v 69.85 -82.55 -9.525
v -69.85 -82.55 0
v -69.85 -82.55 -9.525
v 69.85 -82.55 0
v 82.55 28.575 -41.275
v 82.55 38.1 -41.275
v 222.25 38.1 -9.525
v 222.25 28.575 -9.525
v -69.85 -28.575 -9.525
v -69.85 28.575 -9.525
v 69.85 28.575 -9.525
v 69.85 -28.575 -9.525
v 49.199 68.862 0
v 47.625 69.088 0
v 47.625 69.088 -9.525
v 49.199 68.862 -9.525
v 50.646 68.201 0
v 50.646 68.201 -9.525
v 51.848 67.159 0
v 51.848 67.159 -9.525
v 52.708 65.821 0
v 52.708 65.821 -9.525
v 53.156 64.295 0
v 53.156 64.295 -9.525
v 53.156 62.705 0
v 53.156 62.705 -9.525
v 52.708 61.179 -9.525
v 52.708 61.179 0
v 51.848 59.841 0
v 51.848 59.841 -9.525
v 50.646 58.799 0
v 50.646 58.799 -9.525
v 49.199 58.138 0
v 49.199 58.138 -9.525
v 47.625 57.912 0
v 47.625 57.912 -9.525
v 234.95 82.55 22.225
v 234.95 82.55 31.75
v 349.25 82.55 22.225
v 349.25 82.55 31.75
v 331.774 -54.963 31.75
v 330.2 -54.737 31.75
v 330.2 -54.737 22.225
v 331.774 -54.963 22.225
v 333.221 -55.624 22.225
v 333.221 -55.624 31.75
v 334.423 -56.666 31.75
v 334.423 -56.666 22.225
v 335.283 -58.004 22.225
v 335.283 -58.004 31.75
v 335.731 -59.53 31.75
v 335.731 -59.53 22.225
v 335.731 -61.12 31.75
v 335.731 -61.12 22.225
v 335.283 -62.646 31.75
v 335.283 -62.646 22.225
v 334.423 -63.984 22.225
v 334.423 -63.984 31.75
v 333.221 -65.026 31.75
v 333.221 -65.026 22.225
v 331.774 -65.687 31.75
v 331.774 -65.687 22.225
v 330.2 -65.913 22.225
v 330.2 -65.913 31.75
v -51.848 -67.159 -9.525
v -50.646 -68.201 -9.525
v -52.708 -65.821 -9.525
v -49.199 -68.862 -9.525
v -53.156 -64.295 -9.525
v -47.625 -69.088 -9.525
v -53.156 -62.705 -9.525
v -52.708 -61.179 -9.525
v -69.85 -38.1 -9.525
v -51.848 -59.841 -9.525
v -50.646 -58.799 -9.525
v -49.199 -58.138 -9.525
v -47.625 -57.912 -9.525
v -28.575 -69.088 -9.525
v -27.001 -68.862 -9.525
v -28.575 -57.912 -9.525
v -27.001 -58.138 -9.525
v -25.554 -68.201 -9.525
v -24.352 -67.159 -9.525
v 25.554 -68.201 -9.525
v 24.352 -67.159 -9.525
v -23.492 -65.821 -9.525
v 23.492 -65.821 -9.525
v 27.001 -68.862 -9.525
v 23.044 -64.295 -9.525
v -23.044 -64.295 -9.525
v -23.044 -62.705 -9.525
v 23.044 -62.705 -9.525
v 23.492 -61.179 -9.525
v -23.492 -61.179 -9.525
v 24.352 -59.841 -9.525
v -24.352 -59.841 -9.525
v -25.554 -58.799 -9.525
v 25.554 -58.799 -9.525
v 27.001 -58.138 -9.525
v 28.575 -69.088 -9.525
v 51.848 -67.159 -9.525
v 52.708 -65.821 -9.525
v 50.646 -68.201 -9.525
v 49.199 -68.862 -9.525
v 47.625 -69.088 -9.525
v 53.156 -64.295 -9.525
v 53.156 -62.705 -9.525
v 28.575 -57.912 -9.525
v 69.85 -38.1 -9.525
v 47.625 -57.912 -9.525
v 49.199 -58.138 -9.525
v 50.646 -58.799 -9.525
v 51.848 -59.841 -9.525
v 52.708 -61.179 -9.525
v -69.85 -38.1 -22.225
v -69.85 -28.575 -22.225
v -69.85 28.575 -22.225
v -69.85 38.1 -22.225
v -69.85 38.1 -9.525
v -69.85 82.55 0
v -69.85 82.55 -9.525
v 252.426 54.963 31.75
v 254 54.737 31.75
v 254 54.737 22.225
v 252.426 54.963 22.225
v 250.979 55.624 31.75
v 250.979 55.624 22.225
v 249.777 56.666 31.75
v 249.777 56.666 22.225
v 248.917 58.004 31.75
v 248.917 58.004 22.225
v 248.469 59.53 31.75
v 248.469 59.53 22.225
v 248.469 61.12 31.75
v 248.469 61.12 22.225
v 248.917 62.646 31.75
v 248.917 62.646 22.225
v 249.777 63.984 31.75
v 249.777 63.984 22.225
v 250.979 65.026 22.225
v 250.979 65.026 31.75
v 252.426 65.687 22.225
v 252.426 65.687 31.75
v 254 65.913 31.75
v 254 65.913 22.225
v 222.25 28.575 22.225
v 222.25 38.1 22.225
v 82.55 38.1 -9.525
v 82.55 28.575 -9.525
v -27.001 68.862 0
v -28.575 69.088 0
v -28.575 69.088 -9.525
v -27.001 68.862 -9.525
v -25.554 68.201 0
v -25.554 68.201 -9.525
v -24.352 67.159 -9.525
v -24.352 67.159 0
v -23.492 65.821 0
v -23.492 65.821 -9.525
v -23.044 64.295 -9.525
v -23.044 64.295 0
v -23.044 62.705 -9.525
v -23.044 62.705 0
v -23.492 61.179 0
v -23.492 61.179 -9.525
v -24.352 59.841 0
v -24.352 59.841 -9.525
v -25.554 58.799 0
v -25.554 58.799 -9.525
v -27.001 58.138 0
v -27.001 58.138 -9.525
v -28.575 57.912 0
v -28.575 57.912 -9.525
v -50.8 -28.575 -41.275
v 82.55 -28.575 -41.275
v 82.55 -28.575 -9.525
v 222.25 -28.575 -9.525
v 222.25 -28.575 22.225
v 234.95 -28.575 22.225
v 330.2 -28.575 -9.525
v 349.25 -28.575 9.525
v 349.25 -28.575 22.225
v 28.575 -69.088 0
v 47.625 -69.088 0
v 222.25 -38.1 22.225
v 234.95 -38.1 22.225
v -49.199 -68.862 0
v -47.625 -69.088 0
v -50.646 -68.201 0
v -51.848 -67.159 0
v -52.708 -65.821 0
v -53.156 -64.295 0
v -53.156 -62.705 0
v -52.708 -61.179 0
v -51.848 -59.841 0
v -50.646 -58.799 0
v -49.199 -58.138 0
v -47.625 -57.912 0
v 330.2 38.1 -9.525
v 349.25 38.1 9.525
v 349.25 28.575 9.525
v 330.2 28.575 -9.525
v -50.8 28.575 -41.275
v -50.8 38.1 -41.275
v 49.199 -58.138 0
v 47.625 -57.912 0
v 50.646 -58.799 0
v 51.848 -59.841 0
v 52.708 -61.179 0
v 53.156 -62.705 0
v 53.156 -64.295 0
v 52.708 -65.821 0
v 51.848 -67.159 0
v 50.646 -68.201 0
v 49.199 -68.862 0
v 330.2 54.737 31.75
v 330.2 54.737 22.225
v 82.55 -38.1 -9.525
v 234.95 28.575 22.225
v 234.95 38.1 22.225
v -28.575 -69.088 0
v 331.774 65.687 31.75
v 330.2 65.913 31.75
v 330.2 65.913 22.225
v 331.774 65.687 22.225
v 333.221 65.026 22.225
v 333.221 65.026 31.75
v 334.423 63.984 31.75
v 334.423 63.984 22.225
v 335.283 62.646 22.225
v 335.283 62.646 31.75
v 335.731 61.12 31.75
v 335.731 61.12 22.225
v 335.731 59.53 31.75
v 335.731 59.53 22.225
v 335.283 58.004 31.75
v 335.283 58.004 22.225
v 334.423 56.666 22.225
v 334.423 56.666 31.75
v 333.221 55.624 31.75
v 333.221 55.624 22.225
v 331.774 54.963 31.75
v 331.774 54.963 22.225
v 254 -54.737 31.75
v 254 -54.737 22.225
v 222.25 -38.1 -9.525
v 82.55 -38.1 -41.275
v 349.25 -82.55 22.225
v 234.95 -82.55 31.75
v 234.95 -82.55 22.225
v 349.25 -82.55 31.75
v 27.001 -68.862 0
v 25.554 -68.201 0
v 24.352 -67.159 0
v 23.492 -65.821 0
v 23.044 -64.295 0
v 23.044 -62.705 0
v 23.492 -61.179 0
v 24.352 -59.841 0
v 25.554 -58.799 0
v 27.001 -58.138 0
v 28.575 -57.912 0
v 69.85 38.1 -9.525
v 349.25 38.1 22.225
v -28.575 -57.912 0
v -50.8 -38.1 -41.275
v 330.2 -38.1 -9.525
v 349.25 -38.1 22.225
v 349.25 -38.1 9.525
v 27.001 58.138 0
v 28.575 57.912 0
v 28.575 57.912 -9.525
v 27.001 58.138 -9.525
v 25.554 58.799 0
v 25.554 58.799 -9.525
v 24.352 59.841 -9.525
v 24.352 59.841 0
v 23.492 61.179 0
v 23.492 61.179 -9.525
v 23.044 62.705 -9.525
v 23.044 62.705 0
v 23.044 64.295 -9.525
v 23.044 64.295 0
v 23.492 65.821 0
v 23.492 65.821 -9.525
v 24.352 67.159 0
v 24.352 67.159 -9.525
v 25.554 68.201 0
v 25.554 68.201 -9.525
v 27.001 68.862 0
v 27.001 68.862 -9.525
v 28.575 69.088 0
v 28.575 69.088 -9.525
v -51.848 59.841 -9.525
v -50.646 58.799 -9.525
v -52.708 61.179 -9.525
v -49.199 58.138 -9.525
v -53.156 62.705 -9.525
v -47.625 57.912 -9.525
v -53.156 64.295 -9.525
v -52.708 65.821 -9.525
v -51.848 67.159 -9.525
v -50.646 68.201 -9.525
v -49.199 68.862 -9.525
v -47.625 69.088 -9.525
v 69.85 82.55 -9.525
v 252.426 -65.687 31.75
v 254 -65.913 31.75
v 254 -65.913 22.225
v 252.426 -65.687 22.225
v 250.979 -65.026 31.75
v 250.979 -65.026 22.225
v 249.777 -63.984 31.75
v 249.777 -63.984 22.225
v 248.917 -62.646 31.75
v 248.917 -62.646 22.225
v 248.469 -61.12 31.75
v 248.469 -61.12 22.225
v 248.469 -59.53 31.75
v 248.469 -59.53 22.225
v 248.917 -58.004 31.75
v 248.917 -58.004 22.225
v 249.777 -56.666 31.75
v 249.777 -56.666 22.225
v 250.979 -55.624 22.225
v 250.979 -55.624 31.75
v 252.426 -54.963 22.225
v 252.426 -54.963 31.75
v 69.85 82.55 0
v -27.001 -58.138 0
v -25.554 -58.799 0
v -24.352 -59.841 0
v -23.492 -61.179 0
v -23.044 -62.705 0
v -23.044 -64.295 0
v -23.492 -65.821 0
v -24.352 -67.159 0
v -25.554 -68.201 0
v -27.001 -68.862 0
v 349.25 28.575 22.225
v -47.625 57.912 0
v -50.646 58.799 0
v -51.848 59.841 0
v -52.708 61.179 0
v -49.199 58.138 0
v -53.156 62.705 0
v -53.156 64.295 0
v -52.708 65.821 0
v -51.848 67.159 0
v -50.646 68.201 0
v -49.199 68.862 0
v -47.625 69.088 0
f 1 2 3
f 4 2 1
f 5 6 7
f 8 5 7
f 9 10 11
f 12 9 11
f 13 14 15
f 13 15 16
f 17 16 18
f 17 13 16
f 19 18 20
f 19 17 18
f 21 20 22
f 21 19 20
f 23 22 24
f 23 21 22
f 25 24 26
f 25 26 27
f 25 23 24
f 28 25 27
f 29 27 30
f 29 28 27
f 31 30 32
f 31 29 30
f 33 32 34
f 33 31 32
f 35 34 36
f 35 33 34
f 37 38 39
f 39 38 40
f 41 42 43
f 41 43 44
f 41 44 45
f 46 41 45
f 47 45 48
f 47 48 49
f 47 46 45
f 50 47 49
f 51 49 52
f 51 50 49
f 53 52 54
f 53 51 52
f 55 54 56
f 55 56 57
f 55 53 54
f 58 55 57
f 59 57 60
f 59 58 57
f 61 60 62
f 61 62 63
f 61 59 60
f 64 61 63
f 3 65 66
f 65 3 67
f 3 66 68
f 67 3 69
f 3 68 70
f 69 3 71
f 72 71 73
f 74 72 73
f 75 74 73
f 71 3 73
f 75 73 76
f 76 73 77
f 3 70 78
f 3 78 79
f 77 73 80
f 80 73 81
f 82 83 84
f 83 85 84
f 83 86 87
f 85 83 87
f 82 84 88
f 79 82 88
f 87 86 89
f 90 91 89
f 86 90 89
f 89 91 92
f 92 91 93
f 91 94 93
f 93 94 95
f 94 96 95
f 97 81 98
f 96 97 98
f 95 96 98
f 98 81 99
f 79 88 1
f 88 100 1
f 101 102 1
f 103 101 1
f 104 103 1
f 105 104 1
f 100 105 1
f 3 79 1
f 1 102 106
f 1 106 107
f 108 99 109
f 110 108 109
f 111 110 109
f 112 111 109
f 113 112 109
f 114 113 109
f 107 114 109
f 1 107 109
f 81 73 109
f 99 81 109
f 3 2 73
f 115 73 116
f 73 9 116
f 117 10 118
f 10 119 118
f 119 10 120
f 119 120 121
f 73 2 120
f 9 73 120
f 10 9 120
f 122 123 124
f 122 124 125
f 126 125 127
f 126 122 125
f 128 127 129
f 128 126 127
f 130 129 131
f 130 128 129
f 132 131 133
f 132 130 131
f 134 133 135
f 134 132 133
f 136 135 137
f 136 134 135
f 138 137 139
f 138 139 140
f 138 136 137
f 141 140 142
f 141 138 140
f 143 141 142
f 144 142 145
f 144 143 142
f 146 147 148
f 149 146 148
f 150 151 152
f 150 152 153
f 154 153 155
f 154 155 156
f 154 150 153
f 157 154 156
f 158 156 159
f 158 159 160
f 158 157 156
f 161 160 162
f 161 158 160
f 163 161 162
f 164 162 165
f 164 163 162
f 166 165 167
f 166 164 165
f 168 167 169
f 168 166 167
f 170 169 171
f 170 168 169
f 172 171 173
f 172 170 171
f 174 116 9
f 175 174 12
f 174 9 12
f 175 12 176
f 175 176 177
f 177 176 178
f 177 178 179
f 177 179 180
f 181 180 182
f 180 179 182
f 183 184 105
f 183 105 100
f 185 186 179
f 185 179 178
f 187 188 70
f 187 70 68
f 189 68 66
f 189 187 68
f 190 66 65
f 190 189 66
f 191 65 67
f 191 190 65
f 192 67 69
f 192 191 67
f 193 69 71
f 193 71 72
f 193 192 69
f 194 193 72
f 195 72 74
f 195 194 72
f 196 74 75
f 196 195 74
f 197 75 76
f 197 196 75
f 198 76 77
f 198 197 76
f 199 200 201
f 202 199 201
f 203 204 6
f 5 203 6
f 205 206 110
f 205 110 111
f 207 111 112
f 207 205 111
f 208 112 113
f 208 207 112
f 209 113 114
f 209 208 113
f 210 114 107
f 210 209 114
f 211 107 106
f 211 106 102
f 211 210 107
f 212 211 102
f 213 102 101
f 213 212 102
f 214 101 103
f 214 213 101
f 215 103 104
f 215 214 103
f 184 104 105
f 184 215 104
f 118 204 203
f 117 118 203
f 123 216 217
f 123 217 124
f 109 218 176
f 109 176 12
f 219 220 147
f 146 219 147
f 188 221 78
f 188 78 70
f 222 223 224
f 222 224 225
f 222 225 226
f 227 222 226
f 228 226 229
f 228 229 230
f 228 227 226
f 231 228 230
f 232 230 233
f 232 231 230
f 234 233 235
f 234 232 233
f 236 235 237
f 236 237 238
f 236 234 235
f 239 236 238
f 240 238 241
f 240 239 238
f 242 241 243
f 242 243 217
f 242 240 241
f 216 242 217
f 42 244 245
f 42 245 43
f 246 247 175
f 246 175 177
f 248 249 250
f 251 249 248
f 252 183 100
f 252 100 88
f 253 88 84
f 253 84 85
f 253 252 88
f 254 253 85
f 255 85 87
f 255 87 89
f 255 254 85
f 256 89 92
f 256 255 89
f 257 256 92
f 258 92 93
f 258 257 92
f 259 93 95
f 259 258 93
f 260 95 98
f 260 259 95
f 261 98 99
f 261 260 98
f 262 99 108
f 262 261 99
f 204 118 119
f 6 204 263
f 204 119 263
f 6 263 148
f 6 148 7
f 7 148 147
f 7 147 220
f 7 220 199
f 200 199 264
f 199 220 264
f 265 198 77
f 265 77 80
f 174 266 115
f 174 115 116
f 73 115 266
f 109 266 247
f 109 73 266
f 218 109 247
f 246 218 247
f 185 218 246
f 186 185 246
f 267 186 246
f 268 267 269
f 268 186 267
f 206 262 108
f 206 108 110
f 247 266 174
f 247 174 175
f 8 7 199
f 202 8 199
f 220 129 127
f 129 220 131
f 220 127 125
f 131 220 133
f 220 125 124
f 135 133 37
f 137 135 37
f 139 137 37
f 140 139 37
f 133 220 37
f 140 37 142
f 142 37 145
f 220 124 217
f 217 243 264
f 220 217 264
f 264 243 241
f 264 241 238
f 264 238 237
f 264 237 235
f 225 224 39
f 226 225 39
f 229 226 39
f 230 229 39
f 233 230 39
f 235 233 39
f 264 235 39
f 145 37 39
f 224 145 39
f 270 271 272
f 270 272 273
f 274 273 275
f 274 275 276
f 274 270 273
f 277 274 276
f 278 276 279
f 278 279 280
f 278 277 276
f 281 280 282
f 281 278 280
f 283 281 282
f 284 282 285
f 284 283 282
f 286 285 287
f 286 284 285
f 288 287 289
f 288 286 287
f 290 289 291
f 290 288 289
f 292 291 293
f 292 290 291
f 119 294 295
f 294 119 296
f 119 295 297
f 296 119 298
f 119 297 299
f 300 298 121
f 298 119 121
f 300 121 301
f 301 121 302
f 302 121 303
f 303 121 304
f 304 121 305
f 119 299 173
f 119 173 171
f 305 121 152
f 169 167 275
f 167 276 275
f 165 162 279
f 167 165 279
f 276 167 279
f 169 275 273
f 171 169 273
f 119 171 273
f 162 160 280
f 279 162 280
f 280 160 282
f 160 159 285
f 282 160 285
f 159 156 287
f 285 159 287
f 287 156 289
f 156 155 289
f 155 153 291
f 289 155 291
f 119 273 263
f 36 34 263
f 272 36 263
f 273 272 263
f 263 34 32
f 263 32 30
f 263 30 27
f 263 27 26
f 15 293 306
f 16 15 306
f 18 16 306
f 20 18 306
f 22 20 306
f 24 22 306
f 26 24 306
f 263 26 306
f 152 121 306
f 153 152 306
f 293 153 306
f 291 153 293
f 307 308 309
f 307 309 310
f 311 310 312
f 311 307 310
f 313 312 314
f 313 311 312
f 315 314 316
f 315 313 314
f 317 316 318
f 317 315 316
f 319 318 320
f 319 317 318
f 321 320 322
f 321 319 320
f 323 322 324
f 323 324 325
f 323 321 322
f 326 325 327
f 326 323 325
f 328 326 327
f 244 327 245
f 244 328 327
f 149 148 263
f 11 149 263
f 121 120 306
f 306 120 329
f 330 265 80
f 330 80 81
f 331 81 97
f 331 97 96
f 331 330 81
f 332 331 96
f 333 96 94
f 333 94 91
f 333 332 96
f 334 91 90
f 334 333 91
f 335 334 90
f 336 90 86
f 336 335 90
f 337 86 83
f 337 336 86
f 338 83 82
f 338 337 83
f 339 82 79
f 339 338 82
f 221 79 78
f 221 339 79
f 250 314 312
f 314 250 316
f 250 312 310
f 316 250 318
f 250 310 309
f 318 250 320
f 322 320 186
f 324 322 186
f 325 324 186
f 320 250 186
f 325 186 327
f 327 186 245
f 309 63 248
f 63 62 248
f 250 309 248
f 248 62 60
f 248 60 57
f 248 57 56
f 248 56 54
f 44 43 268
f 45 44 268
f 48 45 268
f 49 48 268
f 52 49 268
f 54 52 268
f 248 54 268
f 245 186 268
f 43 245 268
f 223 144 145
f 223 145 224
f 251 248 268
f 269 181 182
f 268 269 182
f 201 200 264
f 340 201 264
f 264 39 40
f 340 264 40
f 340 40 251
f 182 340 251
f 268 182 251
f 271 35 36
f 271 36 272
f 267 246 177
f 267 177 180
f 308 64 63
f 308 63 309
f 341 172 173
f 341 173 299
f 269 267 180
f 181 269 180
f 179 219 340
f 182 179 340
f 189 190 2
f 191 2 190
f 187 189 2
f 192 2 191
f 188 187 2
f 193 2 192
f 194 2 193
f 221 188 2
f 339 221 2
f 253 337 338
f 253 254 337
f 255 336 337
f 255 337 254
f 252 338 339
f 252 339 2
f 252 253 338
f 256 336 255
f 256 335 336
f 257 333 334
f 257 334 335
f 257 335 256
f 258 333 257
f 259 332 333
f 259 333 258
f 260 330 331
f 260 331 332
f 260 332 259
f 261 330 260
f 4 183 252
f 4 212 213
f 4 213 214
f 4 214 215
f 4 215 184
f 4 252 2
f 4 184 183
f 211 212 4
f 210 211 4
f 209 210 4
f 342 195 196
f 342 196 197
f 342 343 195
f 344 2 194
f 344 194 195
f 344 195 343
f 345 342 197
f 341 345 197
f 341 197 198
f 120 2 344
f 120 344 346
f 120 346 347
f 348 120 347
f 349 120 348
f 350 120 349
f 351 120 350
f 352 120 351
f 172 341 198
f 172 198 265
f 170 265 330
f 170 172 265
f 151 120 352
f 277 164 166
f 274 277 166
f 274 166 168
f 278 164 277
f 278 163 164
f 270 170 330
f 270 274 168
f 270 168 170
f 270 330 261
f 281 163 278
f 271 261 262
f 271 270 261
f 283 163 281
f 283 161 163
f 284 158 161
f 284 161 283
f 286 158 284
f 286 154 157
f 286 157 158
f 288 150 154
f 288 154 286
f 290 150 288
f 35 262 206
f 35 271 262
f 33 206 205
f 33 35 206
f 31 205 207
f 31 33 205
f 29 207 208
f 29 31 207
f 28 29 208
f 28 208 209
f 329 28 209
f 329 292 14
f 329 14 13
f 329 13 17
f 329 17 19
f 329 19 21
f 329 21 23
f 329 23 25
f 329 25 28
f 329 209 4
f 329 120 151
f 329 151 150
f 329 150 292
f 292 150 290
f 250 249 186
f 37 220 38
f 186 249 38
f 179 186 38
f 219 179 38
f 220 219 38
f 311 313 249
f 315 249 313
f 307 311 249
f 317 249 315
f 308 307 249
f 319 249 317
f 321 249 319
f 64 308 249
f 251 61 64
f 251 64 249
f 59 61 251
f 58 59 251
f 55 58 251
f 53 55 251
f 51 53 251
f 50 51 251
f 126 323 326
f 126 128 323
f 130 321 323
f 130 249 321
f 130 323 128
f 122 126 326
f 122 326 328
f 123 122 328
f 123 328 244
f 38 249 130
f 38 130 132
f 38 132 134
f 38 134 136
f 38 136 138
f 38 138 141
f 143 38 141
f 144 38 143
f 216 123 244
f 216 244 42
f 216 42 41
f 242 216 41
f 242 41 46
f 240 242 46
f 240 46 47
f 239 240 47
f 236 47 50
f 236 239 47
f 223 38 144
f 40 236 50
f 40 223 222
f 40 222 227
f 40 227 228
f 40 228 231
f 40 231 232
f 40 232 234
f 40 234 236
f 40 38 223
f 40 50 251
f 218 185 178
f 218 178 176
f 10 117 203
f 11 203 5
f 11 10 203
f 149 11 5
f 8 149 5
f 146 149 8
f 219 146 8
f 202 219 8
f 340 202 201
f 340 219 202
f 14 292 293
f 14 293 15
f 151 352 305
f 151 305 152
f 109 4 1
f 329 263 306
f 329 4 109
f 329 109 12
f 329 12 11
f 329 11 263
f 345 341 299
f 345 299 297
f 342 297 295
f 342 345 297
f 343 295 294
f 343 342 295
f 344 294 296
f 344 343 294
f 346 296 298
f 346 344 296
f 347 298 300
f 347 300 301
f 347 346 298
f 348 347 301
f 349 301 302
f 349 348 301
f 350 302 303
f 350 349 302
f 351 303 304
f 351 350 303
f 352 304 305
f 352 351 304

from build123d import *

# Parameters (mm, degrees)
F0_W     = 139.7
F0_H     = 165.1
F1_DEPTH = 9.525
F3_W     = 114.3
F3_H     = 165.1
F4_DEPTH = 9.525
F7_DEPTH = 9.525
F9_SIZE  = 19.05


with BuildPart() as f1:
    # F0 (on Top) → F1 (new body)
    with BuildSketch(Plane.XY):
        Rectangle(F0_W, F0_H)
        with BuildLine():
            ThreePointArc((-47.625, -69.088), (-53.213, -63.5), (-47.625, -57.912))
            Line((-47.625, -57.912), (-28.575, -57.912))
            ThreePointArc((-28.575, -57.912), (-22.987, -63.5), (-28.575, -69.088))
            Line((-28.575, -69.088), (-47.625, -69.088))
        make_face(mode=Mode.SUBTRACT)
        with BuildLine():
            Line((28.575, -57.912), (47.625, -57.912))
            ThreePointArc((47.625, -57.912), (53.213, -63.5), (47.625, -69.088))
            Line((47.625, -69.088), (28.575, -69.088))
            ThreePointArc((28.575, -69.088), (22.987, -63.5), (28.575, -57.912))
        make_face(mode=Mode.SUBTRACT)
        with BuildLine():
            Line((-28.575, 57.912), (-47.625, 57.912))
            ThreePointArc((-47.625, 57.912), (-53.213, 63.5), (-47.625, 69.088))
            Line((-47.625, 69.088), (-28.575, 69.088))
            ThreePointArc((-28.575, 69.088), (-22.987, 63.5), (-28.575, 57.912))
        make_face(mode=Mode.SUBTRACT)
        with BuildLine():
            ThreePointArc((47.625, 69.088), (53.213, 63.5), (47.625, 57.912))
            Line((47.625, 57.912), (28.575, 57.912))
            ThreePointArc((28.575, 57.912), (22.987, 63.5), (28.575, 69.088))
            Line((28.575, 69.088), (47.625, 69.088))
        make_face(mode=Mode.SUBTRACT)
    extrude(amount=-F1_DEPTH)



with BuildPart() as f4:
    # F3 (on offset) → F4 (new body)
    with BuildSketch(Plane.XY.offset(31.75)):
        with Locations((292.1, 0)):
            Rectangle(F3_W, F3_H)
        with BuildLine():
            ThreePointArc((254, -65.913), (248.412, -60.325), (254, -54.737))
            Line((254, -54.737), (330.2, -54.737))
            ThreePointArc((330.2, -54.737), (335.788, -60.325), (330.2, -65.913))
            Line((330.2, -65.913), (254, -65.913))
        make_face(mode=Mode.SUBTRACT)
        with BuildLine():
            Line((330.2, 54.737), (254, 54.737))
            ThreePointArc((254, 54.737), (248.412, 60.325), (254, 65.913))
            Line((254, 65.913), (330.2, 65.913))
            ThreePointArc((330.2, 65.913), (335.788, 60.325), (330.2, 54.737))
        make_face(mode=Mode.SUBTRACT)
    extrude(amount=-F4_DEPTH)


with BuildPart() as f1_1:
    add(f1.part)

    add(f4.part)  # F7 merges F4
    # F6 (on offset) → F7 (join)
    with BuildSketch(Plane.XZ.offset(38.1)):
        Polygon((69.85, -9.525), (-69.85, -9.525), (-69.85, -41.275), (82.55, -41.275), (222.25, -9.525), (349.25, -9.525), (349.25, 22.225), (234.95, 22.225), (222.25, 22.225), (82.55, -9.525), align=None)
    extrude(amount=-F7_DEPTH)

    # F8: F1 across plane


with BuildPart() as f1_2:
    add(f1_1.part)
    add(f1_1.part.mirror(Plane.XZ))

    # F9
    f9_edges = [f1_2.edges().sort_by_distance(p)[0] for p in [
        (-69.85, -33.3375, -41.275),
        (-69.85, 33.3375, -41.275),
        (349.25, -33.3375, -9.525),
        (349.25, 33.3375, -9.525),
    ]]
    chamfer(f9_edges, length=F9_SIZE)


solid = f1_2.part
